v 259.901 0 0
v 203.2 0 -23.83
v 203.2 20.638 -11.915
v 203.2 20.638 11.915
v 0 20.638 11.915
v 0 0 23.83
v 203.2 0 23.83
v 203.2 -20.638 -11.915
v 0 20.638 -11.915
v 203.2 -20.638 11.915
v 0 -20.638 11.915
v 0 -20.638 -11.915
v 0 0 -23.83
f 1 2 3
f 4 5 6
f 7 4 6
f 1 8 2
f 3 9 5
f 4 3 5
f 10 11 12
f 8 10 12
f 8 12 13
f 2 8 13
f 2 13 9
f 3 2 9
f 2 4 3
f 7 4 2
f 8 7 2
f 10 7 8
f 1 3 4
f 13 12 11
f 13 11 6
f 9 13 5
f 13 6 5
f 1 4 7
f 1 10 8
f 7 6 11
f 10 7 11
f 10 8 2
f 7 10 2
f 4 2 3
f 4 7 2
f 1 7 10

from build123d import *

# Parameters (mm, degrees)
F1_DEPTH = 203.2


# Not quite as in the source:
# - an extrude whose draft closes it to a point is written as a loft to that point


with BuildPart() as f1:
    # F0 (on Right) → F1 (new body)
    with BuildSketch(Plane.YZ):
        Polygon((20.6375, 11.9150661804), (0, 23.8301323608), (-20.6375, 11.9150661804), (-20.6375, -11.9150661804), (0, -23.8301323608), (20.6375, -11.9150661804), align=None)
    extrude(amount=F1_DEPTH)


with BuildPart() as f3:
    # F2 (on face) → F3 section 0
    with BuildSketch(Plane.YZ.offset(203.2), mode=Mode.PRIVATE) as f3_s0:
        Polygon((20.6375, 11.9150661804), (0, 23.8301323608), (-20.6375, 11.9150661804), (-20.6375, -11.9150661804), (0, -23.8301323608), (20.6375, -11.9150661804), align=None)
    loft([f3_s0.sketch, Vertex(259.901065244, 0, 0)], ruled=True)


solid = Compound([f1.part, f3.part])
